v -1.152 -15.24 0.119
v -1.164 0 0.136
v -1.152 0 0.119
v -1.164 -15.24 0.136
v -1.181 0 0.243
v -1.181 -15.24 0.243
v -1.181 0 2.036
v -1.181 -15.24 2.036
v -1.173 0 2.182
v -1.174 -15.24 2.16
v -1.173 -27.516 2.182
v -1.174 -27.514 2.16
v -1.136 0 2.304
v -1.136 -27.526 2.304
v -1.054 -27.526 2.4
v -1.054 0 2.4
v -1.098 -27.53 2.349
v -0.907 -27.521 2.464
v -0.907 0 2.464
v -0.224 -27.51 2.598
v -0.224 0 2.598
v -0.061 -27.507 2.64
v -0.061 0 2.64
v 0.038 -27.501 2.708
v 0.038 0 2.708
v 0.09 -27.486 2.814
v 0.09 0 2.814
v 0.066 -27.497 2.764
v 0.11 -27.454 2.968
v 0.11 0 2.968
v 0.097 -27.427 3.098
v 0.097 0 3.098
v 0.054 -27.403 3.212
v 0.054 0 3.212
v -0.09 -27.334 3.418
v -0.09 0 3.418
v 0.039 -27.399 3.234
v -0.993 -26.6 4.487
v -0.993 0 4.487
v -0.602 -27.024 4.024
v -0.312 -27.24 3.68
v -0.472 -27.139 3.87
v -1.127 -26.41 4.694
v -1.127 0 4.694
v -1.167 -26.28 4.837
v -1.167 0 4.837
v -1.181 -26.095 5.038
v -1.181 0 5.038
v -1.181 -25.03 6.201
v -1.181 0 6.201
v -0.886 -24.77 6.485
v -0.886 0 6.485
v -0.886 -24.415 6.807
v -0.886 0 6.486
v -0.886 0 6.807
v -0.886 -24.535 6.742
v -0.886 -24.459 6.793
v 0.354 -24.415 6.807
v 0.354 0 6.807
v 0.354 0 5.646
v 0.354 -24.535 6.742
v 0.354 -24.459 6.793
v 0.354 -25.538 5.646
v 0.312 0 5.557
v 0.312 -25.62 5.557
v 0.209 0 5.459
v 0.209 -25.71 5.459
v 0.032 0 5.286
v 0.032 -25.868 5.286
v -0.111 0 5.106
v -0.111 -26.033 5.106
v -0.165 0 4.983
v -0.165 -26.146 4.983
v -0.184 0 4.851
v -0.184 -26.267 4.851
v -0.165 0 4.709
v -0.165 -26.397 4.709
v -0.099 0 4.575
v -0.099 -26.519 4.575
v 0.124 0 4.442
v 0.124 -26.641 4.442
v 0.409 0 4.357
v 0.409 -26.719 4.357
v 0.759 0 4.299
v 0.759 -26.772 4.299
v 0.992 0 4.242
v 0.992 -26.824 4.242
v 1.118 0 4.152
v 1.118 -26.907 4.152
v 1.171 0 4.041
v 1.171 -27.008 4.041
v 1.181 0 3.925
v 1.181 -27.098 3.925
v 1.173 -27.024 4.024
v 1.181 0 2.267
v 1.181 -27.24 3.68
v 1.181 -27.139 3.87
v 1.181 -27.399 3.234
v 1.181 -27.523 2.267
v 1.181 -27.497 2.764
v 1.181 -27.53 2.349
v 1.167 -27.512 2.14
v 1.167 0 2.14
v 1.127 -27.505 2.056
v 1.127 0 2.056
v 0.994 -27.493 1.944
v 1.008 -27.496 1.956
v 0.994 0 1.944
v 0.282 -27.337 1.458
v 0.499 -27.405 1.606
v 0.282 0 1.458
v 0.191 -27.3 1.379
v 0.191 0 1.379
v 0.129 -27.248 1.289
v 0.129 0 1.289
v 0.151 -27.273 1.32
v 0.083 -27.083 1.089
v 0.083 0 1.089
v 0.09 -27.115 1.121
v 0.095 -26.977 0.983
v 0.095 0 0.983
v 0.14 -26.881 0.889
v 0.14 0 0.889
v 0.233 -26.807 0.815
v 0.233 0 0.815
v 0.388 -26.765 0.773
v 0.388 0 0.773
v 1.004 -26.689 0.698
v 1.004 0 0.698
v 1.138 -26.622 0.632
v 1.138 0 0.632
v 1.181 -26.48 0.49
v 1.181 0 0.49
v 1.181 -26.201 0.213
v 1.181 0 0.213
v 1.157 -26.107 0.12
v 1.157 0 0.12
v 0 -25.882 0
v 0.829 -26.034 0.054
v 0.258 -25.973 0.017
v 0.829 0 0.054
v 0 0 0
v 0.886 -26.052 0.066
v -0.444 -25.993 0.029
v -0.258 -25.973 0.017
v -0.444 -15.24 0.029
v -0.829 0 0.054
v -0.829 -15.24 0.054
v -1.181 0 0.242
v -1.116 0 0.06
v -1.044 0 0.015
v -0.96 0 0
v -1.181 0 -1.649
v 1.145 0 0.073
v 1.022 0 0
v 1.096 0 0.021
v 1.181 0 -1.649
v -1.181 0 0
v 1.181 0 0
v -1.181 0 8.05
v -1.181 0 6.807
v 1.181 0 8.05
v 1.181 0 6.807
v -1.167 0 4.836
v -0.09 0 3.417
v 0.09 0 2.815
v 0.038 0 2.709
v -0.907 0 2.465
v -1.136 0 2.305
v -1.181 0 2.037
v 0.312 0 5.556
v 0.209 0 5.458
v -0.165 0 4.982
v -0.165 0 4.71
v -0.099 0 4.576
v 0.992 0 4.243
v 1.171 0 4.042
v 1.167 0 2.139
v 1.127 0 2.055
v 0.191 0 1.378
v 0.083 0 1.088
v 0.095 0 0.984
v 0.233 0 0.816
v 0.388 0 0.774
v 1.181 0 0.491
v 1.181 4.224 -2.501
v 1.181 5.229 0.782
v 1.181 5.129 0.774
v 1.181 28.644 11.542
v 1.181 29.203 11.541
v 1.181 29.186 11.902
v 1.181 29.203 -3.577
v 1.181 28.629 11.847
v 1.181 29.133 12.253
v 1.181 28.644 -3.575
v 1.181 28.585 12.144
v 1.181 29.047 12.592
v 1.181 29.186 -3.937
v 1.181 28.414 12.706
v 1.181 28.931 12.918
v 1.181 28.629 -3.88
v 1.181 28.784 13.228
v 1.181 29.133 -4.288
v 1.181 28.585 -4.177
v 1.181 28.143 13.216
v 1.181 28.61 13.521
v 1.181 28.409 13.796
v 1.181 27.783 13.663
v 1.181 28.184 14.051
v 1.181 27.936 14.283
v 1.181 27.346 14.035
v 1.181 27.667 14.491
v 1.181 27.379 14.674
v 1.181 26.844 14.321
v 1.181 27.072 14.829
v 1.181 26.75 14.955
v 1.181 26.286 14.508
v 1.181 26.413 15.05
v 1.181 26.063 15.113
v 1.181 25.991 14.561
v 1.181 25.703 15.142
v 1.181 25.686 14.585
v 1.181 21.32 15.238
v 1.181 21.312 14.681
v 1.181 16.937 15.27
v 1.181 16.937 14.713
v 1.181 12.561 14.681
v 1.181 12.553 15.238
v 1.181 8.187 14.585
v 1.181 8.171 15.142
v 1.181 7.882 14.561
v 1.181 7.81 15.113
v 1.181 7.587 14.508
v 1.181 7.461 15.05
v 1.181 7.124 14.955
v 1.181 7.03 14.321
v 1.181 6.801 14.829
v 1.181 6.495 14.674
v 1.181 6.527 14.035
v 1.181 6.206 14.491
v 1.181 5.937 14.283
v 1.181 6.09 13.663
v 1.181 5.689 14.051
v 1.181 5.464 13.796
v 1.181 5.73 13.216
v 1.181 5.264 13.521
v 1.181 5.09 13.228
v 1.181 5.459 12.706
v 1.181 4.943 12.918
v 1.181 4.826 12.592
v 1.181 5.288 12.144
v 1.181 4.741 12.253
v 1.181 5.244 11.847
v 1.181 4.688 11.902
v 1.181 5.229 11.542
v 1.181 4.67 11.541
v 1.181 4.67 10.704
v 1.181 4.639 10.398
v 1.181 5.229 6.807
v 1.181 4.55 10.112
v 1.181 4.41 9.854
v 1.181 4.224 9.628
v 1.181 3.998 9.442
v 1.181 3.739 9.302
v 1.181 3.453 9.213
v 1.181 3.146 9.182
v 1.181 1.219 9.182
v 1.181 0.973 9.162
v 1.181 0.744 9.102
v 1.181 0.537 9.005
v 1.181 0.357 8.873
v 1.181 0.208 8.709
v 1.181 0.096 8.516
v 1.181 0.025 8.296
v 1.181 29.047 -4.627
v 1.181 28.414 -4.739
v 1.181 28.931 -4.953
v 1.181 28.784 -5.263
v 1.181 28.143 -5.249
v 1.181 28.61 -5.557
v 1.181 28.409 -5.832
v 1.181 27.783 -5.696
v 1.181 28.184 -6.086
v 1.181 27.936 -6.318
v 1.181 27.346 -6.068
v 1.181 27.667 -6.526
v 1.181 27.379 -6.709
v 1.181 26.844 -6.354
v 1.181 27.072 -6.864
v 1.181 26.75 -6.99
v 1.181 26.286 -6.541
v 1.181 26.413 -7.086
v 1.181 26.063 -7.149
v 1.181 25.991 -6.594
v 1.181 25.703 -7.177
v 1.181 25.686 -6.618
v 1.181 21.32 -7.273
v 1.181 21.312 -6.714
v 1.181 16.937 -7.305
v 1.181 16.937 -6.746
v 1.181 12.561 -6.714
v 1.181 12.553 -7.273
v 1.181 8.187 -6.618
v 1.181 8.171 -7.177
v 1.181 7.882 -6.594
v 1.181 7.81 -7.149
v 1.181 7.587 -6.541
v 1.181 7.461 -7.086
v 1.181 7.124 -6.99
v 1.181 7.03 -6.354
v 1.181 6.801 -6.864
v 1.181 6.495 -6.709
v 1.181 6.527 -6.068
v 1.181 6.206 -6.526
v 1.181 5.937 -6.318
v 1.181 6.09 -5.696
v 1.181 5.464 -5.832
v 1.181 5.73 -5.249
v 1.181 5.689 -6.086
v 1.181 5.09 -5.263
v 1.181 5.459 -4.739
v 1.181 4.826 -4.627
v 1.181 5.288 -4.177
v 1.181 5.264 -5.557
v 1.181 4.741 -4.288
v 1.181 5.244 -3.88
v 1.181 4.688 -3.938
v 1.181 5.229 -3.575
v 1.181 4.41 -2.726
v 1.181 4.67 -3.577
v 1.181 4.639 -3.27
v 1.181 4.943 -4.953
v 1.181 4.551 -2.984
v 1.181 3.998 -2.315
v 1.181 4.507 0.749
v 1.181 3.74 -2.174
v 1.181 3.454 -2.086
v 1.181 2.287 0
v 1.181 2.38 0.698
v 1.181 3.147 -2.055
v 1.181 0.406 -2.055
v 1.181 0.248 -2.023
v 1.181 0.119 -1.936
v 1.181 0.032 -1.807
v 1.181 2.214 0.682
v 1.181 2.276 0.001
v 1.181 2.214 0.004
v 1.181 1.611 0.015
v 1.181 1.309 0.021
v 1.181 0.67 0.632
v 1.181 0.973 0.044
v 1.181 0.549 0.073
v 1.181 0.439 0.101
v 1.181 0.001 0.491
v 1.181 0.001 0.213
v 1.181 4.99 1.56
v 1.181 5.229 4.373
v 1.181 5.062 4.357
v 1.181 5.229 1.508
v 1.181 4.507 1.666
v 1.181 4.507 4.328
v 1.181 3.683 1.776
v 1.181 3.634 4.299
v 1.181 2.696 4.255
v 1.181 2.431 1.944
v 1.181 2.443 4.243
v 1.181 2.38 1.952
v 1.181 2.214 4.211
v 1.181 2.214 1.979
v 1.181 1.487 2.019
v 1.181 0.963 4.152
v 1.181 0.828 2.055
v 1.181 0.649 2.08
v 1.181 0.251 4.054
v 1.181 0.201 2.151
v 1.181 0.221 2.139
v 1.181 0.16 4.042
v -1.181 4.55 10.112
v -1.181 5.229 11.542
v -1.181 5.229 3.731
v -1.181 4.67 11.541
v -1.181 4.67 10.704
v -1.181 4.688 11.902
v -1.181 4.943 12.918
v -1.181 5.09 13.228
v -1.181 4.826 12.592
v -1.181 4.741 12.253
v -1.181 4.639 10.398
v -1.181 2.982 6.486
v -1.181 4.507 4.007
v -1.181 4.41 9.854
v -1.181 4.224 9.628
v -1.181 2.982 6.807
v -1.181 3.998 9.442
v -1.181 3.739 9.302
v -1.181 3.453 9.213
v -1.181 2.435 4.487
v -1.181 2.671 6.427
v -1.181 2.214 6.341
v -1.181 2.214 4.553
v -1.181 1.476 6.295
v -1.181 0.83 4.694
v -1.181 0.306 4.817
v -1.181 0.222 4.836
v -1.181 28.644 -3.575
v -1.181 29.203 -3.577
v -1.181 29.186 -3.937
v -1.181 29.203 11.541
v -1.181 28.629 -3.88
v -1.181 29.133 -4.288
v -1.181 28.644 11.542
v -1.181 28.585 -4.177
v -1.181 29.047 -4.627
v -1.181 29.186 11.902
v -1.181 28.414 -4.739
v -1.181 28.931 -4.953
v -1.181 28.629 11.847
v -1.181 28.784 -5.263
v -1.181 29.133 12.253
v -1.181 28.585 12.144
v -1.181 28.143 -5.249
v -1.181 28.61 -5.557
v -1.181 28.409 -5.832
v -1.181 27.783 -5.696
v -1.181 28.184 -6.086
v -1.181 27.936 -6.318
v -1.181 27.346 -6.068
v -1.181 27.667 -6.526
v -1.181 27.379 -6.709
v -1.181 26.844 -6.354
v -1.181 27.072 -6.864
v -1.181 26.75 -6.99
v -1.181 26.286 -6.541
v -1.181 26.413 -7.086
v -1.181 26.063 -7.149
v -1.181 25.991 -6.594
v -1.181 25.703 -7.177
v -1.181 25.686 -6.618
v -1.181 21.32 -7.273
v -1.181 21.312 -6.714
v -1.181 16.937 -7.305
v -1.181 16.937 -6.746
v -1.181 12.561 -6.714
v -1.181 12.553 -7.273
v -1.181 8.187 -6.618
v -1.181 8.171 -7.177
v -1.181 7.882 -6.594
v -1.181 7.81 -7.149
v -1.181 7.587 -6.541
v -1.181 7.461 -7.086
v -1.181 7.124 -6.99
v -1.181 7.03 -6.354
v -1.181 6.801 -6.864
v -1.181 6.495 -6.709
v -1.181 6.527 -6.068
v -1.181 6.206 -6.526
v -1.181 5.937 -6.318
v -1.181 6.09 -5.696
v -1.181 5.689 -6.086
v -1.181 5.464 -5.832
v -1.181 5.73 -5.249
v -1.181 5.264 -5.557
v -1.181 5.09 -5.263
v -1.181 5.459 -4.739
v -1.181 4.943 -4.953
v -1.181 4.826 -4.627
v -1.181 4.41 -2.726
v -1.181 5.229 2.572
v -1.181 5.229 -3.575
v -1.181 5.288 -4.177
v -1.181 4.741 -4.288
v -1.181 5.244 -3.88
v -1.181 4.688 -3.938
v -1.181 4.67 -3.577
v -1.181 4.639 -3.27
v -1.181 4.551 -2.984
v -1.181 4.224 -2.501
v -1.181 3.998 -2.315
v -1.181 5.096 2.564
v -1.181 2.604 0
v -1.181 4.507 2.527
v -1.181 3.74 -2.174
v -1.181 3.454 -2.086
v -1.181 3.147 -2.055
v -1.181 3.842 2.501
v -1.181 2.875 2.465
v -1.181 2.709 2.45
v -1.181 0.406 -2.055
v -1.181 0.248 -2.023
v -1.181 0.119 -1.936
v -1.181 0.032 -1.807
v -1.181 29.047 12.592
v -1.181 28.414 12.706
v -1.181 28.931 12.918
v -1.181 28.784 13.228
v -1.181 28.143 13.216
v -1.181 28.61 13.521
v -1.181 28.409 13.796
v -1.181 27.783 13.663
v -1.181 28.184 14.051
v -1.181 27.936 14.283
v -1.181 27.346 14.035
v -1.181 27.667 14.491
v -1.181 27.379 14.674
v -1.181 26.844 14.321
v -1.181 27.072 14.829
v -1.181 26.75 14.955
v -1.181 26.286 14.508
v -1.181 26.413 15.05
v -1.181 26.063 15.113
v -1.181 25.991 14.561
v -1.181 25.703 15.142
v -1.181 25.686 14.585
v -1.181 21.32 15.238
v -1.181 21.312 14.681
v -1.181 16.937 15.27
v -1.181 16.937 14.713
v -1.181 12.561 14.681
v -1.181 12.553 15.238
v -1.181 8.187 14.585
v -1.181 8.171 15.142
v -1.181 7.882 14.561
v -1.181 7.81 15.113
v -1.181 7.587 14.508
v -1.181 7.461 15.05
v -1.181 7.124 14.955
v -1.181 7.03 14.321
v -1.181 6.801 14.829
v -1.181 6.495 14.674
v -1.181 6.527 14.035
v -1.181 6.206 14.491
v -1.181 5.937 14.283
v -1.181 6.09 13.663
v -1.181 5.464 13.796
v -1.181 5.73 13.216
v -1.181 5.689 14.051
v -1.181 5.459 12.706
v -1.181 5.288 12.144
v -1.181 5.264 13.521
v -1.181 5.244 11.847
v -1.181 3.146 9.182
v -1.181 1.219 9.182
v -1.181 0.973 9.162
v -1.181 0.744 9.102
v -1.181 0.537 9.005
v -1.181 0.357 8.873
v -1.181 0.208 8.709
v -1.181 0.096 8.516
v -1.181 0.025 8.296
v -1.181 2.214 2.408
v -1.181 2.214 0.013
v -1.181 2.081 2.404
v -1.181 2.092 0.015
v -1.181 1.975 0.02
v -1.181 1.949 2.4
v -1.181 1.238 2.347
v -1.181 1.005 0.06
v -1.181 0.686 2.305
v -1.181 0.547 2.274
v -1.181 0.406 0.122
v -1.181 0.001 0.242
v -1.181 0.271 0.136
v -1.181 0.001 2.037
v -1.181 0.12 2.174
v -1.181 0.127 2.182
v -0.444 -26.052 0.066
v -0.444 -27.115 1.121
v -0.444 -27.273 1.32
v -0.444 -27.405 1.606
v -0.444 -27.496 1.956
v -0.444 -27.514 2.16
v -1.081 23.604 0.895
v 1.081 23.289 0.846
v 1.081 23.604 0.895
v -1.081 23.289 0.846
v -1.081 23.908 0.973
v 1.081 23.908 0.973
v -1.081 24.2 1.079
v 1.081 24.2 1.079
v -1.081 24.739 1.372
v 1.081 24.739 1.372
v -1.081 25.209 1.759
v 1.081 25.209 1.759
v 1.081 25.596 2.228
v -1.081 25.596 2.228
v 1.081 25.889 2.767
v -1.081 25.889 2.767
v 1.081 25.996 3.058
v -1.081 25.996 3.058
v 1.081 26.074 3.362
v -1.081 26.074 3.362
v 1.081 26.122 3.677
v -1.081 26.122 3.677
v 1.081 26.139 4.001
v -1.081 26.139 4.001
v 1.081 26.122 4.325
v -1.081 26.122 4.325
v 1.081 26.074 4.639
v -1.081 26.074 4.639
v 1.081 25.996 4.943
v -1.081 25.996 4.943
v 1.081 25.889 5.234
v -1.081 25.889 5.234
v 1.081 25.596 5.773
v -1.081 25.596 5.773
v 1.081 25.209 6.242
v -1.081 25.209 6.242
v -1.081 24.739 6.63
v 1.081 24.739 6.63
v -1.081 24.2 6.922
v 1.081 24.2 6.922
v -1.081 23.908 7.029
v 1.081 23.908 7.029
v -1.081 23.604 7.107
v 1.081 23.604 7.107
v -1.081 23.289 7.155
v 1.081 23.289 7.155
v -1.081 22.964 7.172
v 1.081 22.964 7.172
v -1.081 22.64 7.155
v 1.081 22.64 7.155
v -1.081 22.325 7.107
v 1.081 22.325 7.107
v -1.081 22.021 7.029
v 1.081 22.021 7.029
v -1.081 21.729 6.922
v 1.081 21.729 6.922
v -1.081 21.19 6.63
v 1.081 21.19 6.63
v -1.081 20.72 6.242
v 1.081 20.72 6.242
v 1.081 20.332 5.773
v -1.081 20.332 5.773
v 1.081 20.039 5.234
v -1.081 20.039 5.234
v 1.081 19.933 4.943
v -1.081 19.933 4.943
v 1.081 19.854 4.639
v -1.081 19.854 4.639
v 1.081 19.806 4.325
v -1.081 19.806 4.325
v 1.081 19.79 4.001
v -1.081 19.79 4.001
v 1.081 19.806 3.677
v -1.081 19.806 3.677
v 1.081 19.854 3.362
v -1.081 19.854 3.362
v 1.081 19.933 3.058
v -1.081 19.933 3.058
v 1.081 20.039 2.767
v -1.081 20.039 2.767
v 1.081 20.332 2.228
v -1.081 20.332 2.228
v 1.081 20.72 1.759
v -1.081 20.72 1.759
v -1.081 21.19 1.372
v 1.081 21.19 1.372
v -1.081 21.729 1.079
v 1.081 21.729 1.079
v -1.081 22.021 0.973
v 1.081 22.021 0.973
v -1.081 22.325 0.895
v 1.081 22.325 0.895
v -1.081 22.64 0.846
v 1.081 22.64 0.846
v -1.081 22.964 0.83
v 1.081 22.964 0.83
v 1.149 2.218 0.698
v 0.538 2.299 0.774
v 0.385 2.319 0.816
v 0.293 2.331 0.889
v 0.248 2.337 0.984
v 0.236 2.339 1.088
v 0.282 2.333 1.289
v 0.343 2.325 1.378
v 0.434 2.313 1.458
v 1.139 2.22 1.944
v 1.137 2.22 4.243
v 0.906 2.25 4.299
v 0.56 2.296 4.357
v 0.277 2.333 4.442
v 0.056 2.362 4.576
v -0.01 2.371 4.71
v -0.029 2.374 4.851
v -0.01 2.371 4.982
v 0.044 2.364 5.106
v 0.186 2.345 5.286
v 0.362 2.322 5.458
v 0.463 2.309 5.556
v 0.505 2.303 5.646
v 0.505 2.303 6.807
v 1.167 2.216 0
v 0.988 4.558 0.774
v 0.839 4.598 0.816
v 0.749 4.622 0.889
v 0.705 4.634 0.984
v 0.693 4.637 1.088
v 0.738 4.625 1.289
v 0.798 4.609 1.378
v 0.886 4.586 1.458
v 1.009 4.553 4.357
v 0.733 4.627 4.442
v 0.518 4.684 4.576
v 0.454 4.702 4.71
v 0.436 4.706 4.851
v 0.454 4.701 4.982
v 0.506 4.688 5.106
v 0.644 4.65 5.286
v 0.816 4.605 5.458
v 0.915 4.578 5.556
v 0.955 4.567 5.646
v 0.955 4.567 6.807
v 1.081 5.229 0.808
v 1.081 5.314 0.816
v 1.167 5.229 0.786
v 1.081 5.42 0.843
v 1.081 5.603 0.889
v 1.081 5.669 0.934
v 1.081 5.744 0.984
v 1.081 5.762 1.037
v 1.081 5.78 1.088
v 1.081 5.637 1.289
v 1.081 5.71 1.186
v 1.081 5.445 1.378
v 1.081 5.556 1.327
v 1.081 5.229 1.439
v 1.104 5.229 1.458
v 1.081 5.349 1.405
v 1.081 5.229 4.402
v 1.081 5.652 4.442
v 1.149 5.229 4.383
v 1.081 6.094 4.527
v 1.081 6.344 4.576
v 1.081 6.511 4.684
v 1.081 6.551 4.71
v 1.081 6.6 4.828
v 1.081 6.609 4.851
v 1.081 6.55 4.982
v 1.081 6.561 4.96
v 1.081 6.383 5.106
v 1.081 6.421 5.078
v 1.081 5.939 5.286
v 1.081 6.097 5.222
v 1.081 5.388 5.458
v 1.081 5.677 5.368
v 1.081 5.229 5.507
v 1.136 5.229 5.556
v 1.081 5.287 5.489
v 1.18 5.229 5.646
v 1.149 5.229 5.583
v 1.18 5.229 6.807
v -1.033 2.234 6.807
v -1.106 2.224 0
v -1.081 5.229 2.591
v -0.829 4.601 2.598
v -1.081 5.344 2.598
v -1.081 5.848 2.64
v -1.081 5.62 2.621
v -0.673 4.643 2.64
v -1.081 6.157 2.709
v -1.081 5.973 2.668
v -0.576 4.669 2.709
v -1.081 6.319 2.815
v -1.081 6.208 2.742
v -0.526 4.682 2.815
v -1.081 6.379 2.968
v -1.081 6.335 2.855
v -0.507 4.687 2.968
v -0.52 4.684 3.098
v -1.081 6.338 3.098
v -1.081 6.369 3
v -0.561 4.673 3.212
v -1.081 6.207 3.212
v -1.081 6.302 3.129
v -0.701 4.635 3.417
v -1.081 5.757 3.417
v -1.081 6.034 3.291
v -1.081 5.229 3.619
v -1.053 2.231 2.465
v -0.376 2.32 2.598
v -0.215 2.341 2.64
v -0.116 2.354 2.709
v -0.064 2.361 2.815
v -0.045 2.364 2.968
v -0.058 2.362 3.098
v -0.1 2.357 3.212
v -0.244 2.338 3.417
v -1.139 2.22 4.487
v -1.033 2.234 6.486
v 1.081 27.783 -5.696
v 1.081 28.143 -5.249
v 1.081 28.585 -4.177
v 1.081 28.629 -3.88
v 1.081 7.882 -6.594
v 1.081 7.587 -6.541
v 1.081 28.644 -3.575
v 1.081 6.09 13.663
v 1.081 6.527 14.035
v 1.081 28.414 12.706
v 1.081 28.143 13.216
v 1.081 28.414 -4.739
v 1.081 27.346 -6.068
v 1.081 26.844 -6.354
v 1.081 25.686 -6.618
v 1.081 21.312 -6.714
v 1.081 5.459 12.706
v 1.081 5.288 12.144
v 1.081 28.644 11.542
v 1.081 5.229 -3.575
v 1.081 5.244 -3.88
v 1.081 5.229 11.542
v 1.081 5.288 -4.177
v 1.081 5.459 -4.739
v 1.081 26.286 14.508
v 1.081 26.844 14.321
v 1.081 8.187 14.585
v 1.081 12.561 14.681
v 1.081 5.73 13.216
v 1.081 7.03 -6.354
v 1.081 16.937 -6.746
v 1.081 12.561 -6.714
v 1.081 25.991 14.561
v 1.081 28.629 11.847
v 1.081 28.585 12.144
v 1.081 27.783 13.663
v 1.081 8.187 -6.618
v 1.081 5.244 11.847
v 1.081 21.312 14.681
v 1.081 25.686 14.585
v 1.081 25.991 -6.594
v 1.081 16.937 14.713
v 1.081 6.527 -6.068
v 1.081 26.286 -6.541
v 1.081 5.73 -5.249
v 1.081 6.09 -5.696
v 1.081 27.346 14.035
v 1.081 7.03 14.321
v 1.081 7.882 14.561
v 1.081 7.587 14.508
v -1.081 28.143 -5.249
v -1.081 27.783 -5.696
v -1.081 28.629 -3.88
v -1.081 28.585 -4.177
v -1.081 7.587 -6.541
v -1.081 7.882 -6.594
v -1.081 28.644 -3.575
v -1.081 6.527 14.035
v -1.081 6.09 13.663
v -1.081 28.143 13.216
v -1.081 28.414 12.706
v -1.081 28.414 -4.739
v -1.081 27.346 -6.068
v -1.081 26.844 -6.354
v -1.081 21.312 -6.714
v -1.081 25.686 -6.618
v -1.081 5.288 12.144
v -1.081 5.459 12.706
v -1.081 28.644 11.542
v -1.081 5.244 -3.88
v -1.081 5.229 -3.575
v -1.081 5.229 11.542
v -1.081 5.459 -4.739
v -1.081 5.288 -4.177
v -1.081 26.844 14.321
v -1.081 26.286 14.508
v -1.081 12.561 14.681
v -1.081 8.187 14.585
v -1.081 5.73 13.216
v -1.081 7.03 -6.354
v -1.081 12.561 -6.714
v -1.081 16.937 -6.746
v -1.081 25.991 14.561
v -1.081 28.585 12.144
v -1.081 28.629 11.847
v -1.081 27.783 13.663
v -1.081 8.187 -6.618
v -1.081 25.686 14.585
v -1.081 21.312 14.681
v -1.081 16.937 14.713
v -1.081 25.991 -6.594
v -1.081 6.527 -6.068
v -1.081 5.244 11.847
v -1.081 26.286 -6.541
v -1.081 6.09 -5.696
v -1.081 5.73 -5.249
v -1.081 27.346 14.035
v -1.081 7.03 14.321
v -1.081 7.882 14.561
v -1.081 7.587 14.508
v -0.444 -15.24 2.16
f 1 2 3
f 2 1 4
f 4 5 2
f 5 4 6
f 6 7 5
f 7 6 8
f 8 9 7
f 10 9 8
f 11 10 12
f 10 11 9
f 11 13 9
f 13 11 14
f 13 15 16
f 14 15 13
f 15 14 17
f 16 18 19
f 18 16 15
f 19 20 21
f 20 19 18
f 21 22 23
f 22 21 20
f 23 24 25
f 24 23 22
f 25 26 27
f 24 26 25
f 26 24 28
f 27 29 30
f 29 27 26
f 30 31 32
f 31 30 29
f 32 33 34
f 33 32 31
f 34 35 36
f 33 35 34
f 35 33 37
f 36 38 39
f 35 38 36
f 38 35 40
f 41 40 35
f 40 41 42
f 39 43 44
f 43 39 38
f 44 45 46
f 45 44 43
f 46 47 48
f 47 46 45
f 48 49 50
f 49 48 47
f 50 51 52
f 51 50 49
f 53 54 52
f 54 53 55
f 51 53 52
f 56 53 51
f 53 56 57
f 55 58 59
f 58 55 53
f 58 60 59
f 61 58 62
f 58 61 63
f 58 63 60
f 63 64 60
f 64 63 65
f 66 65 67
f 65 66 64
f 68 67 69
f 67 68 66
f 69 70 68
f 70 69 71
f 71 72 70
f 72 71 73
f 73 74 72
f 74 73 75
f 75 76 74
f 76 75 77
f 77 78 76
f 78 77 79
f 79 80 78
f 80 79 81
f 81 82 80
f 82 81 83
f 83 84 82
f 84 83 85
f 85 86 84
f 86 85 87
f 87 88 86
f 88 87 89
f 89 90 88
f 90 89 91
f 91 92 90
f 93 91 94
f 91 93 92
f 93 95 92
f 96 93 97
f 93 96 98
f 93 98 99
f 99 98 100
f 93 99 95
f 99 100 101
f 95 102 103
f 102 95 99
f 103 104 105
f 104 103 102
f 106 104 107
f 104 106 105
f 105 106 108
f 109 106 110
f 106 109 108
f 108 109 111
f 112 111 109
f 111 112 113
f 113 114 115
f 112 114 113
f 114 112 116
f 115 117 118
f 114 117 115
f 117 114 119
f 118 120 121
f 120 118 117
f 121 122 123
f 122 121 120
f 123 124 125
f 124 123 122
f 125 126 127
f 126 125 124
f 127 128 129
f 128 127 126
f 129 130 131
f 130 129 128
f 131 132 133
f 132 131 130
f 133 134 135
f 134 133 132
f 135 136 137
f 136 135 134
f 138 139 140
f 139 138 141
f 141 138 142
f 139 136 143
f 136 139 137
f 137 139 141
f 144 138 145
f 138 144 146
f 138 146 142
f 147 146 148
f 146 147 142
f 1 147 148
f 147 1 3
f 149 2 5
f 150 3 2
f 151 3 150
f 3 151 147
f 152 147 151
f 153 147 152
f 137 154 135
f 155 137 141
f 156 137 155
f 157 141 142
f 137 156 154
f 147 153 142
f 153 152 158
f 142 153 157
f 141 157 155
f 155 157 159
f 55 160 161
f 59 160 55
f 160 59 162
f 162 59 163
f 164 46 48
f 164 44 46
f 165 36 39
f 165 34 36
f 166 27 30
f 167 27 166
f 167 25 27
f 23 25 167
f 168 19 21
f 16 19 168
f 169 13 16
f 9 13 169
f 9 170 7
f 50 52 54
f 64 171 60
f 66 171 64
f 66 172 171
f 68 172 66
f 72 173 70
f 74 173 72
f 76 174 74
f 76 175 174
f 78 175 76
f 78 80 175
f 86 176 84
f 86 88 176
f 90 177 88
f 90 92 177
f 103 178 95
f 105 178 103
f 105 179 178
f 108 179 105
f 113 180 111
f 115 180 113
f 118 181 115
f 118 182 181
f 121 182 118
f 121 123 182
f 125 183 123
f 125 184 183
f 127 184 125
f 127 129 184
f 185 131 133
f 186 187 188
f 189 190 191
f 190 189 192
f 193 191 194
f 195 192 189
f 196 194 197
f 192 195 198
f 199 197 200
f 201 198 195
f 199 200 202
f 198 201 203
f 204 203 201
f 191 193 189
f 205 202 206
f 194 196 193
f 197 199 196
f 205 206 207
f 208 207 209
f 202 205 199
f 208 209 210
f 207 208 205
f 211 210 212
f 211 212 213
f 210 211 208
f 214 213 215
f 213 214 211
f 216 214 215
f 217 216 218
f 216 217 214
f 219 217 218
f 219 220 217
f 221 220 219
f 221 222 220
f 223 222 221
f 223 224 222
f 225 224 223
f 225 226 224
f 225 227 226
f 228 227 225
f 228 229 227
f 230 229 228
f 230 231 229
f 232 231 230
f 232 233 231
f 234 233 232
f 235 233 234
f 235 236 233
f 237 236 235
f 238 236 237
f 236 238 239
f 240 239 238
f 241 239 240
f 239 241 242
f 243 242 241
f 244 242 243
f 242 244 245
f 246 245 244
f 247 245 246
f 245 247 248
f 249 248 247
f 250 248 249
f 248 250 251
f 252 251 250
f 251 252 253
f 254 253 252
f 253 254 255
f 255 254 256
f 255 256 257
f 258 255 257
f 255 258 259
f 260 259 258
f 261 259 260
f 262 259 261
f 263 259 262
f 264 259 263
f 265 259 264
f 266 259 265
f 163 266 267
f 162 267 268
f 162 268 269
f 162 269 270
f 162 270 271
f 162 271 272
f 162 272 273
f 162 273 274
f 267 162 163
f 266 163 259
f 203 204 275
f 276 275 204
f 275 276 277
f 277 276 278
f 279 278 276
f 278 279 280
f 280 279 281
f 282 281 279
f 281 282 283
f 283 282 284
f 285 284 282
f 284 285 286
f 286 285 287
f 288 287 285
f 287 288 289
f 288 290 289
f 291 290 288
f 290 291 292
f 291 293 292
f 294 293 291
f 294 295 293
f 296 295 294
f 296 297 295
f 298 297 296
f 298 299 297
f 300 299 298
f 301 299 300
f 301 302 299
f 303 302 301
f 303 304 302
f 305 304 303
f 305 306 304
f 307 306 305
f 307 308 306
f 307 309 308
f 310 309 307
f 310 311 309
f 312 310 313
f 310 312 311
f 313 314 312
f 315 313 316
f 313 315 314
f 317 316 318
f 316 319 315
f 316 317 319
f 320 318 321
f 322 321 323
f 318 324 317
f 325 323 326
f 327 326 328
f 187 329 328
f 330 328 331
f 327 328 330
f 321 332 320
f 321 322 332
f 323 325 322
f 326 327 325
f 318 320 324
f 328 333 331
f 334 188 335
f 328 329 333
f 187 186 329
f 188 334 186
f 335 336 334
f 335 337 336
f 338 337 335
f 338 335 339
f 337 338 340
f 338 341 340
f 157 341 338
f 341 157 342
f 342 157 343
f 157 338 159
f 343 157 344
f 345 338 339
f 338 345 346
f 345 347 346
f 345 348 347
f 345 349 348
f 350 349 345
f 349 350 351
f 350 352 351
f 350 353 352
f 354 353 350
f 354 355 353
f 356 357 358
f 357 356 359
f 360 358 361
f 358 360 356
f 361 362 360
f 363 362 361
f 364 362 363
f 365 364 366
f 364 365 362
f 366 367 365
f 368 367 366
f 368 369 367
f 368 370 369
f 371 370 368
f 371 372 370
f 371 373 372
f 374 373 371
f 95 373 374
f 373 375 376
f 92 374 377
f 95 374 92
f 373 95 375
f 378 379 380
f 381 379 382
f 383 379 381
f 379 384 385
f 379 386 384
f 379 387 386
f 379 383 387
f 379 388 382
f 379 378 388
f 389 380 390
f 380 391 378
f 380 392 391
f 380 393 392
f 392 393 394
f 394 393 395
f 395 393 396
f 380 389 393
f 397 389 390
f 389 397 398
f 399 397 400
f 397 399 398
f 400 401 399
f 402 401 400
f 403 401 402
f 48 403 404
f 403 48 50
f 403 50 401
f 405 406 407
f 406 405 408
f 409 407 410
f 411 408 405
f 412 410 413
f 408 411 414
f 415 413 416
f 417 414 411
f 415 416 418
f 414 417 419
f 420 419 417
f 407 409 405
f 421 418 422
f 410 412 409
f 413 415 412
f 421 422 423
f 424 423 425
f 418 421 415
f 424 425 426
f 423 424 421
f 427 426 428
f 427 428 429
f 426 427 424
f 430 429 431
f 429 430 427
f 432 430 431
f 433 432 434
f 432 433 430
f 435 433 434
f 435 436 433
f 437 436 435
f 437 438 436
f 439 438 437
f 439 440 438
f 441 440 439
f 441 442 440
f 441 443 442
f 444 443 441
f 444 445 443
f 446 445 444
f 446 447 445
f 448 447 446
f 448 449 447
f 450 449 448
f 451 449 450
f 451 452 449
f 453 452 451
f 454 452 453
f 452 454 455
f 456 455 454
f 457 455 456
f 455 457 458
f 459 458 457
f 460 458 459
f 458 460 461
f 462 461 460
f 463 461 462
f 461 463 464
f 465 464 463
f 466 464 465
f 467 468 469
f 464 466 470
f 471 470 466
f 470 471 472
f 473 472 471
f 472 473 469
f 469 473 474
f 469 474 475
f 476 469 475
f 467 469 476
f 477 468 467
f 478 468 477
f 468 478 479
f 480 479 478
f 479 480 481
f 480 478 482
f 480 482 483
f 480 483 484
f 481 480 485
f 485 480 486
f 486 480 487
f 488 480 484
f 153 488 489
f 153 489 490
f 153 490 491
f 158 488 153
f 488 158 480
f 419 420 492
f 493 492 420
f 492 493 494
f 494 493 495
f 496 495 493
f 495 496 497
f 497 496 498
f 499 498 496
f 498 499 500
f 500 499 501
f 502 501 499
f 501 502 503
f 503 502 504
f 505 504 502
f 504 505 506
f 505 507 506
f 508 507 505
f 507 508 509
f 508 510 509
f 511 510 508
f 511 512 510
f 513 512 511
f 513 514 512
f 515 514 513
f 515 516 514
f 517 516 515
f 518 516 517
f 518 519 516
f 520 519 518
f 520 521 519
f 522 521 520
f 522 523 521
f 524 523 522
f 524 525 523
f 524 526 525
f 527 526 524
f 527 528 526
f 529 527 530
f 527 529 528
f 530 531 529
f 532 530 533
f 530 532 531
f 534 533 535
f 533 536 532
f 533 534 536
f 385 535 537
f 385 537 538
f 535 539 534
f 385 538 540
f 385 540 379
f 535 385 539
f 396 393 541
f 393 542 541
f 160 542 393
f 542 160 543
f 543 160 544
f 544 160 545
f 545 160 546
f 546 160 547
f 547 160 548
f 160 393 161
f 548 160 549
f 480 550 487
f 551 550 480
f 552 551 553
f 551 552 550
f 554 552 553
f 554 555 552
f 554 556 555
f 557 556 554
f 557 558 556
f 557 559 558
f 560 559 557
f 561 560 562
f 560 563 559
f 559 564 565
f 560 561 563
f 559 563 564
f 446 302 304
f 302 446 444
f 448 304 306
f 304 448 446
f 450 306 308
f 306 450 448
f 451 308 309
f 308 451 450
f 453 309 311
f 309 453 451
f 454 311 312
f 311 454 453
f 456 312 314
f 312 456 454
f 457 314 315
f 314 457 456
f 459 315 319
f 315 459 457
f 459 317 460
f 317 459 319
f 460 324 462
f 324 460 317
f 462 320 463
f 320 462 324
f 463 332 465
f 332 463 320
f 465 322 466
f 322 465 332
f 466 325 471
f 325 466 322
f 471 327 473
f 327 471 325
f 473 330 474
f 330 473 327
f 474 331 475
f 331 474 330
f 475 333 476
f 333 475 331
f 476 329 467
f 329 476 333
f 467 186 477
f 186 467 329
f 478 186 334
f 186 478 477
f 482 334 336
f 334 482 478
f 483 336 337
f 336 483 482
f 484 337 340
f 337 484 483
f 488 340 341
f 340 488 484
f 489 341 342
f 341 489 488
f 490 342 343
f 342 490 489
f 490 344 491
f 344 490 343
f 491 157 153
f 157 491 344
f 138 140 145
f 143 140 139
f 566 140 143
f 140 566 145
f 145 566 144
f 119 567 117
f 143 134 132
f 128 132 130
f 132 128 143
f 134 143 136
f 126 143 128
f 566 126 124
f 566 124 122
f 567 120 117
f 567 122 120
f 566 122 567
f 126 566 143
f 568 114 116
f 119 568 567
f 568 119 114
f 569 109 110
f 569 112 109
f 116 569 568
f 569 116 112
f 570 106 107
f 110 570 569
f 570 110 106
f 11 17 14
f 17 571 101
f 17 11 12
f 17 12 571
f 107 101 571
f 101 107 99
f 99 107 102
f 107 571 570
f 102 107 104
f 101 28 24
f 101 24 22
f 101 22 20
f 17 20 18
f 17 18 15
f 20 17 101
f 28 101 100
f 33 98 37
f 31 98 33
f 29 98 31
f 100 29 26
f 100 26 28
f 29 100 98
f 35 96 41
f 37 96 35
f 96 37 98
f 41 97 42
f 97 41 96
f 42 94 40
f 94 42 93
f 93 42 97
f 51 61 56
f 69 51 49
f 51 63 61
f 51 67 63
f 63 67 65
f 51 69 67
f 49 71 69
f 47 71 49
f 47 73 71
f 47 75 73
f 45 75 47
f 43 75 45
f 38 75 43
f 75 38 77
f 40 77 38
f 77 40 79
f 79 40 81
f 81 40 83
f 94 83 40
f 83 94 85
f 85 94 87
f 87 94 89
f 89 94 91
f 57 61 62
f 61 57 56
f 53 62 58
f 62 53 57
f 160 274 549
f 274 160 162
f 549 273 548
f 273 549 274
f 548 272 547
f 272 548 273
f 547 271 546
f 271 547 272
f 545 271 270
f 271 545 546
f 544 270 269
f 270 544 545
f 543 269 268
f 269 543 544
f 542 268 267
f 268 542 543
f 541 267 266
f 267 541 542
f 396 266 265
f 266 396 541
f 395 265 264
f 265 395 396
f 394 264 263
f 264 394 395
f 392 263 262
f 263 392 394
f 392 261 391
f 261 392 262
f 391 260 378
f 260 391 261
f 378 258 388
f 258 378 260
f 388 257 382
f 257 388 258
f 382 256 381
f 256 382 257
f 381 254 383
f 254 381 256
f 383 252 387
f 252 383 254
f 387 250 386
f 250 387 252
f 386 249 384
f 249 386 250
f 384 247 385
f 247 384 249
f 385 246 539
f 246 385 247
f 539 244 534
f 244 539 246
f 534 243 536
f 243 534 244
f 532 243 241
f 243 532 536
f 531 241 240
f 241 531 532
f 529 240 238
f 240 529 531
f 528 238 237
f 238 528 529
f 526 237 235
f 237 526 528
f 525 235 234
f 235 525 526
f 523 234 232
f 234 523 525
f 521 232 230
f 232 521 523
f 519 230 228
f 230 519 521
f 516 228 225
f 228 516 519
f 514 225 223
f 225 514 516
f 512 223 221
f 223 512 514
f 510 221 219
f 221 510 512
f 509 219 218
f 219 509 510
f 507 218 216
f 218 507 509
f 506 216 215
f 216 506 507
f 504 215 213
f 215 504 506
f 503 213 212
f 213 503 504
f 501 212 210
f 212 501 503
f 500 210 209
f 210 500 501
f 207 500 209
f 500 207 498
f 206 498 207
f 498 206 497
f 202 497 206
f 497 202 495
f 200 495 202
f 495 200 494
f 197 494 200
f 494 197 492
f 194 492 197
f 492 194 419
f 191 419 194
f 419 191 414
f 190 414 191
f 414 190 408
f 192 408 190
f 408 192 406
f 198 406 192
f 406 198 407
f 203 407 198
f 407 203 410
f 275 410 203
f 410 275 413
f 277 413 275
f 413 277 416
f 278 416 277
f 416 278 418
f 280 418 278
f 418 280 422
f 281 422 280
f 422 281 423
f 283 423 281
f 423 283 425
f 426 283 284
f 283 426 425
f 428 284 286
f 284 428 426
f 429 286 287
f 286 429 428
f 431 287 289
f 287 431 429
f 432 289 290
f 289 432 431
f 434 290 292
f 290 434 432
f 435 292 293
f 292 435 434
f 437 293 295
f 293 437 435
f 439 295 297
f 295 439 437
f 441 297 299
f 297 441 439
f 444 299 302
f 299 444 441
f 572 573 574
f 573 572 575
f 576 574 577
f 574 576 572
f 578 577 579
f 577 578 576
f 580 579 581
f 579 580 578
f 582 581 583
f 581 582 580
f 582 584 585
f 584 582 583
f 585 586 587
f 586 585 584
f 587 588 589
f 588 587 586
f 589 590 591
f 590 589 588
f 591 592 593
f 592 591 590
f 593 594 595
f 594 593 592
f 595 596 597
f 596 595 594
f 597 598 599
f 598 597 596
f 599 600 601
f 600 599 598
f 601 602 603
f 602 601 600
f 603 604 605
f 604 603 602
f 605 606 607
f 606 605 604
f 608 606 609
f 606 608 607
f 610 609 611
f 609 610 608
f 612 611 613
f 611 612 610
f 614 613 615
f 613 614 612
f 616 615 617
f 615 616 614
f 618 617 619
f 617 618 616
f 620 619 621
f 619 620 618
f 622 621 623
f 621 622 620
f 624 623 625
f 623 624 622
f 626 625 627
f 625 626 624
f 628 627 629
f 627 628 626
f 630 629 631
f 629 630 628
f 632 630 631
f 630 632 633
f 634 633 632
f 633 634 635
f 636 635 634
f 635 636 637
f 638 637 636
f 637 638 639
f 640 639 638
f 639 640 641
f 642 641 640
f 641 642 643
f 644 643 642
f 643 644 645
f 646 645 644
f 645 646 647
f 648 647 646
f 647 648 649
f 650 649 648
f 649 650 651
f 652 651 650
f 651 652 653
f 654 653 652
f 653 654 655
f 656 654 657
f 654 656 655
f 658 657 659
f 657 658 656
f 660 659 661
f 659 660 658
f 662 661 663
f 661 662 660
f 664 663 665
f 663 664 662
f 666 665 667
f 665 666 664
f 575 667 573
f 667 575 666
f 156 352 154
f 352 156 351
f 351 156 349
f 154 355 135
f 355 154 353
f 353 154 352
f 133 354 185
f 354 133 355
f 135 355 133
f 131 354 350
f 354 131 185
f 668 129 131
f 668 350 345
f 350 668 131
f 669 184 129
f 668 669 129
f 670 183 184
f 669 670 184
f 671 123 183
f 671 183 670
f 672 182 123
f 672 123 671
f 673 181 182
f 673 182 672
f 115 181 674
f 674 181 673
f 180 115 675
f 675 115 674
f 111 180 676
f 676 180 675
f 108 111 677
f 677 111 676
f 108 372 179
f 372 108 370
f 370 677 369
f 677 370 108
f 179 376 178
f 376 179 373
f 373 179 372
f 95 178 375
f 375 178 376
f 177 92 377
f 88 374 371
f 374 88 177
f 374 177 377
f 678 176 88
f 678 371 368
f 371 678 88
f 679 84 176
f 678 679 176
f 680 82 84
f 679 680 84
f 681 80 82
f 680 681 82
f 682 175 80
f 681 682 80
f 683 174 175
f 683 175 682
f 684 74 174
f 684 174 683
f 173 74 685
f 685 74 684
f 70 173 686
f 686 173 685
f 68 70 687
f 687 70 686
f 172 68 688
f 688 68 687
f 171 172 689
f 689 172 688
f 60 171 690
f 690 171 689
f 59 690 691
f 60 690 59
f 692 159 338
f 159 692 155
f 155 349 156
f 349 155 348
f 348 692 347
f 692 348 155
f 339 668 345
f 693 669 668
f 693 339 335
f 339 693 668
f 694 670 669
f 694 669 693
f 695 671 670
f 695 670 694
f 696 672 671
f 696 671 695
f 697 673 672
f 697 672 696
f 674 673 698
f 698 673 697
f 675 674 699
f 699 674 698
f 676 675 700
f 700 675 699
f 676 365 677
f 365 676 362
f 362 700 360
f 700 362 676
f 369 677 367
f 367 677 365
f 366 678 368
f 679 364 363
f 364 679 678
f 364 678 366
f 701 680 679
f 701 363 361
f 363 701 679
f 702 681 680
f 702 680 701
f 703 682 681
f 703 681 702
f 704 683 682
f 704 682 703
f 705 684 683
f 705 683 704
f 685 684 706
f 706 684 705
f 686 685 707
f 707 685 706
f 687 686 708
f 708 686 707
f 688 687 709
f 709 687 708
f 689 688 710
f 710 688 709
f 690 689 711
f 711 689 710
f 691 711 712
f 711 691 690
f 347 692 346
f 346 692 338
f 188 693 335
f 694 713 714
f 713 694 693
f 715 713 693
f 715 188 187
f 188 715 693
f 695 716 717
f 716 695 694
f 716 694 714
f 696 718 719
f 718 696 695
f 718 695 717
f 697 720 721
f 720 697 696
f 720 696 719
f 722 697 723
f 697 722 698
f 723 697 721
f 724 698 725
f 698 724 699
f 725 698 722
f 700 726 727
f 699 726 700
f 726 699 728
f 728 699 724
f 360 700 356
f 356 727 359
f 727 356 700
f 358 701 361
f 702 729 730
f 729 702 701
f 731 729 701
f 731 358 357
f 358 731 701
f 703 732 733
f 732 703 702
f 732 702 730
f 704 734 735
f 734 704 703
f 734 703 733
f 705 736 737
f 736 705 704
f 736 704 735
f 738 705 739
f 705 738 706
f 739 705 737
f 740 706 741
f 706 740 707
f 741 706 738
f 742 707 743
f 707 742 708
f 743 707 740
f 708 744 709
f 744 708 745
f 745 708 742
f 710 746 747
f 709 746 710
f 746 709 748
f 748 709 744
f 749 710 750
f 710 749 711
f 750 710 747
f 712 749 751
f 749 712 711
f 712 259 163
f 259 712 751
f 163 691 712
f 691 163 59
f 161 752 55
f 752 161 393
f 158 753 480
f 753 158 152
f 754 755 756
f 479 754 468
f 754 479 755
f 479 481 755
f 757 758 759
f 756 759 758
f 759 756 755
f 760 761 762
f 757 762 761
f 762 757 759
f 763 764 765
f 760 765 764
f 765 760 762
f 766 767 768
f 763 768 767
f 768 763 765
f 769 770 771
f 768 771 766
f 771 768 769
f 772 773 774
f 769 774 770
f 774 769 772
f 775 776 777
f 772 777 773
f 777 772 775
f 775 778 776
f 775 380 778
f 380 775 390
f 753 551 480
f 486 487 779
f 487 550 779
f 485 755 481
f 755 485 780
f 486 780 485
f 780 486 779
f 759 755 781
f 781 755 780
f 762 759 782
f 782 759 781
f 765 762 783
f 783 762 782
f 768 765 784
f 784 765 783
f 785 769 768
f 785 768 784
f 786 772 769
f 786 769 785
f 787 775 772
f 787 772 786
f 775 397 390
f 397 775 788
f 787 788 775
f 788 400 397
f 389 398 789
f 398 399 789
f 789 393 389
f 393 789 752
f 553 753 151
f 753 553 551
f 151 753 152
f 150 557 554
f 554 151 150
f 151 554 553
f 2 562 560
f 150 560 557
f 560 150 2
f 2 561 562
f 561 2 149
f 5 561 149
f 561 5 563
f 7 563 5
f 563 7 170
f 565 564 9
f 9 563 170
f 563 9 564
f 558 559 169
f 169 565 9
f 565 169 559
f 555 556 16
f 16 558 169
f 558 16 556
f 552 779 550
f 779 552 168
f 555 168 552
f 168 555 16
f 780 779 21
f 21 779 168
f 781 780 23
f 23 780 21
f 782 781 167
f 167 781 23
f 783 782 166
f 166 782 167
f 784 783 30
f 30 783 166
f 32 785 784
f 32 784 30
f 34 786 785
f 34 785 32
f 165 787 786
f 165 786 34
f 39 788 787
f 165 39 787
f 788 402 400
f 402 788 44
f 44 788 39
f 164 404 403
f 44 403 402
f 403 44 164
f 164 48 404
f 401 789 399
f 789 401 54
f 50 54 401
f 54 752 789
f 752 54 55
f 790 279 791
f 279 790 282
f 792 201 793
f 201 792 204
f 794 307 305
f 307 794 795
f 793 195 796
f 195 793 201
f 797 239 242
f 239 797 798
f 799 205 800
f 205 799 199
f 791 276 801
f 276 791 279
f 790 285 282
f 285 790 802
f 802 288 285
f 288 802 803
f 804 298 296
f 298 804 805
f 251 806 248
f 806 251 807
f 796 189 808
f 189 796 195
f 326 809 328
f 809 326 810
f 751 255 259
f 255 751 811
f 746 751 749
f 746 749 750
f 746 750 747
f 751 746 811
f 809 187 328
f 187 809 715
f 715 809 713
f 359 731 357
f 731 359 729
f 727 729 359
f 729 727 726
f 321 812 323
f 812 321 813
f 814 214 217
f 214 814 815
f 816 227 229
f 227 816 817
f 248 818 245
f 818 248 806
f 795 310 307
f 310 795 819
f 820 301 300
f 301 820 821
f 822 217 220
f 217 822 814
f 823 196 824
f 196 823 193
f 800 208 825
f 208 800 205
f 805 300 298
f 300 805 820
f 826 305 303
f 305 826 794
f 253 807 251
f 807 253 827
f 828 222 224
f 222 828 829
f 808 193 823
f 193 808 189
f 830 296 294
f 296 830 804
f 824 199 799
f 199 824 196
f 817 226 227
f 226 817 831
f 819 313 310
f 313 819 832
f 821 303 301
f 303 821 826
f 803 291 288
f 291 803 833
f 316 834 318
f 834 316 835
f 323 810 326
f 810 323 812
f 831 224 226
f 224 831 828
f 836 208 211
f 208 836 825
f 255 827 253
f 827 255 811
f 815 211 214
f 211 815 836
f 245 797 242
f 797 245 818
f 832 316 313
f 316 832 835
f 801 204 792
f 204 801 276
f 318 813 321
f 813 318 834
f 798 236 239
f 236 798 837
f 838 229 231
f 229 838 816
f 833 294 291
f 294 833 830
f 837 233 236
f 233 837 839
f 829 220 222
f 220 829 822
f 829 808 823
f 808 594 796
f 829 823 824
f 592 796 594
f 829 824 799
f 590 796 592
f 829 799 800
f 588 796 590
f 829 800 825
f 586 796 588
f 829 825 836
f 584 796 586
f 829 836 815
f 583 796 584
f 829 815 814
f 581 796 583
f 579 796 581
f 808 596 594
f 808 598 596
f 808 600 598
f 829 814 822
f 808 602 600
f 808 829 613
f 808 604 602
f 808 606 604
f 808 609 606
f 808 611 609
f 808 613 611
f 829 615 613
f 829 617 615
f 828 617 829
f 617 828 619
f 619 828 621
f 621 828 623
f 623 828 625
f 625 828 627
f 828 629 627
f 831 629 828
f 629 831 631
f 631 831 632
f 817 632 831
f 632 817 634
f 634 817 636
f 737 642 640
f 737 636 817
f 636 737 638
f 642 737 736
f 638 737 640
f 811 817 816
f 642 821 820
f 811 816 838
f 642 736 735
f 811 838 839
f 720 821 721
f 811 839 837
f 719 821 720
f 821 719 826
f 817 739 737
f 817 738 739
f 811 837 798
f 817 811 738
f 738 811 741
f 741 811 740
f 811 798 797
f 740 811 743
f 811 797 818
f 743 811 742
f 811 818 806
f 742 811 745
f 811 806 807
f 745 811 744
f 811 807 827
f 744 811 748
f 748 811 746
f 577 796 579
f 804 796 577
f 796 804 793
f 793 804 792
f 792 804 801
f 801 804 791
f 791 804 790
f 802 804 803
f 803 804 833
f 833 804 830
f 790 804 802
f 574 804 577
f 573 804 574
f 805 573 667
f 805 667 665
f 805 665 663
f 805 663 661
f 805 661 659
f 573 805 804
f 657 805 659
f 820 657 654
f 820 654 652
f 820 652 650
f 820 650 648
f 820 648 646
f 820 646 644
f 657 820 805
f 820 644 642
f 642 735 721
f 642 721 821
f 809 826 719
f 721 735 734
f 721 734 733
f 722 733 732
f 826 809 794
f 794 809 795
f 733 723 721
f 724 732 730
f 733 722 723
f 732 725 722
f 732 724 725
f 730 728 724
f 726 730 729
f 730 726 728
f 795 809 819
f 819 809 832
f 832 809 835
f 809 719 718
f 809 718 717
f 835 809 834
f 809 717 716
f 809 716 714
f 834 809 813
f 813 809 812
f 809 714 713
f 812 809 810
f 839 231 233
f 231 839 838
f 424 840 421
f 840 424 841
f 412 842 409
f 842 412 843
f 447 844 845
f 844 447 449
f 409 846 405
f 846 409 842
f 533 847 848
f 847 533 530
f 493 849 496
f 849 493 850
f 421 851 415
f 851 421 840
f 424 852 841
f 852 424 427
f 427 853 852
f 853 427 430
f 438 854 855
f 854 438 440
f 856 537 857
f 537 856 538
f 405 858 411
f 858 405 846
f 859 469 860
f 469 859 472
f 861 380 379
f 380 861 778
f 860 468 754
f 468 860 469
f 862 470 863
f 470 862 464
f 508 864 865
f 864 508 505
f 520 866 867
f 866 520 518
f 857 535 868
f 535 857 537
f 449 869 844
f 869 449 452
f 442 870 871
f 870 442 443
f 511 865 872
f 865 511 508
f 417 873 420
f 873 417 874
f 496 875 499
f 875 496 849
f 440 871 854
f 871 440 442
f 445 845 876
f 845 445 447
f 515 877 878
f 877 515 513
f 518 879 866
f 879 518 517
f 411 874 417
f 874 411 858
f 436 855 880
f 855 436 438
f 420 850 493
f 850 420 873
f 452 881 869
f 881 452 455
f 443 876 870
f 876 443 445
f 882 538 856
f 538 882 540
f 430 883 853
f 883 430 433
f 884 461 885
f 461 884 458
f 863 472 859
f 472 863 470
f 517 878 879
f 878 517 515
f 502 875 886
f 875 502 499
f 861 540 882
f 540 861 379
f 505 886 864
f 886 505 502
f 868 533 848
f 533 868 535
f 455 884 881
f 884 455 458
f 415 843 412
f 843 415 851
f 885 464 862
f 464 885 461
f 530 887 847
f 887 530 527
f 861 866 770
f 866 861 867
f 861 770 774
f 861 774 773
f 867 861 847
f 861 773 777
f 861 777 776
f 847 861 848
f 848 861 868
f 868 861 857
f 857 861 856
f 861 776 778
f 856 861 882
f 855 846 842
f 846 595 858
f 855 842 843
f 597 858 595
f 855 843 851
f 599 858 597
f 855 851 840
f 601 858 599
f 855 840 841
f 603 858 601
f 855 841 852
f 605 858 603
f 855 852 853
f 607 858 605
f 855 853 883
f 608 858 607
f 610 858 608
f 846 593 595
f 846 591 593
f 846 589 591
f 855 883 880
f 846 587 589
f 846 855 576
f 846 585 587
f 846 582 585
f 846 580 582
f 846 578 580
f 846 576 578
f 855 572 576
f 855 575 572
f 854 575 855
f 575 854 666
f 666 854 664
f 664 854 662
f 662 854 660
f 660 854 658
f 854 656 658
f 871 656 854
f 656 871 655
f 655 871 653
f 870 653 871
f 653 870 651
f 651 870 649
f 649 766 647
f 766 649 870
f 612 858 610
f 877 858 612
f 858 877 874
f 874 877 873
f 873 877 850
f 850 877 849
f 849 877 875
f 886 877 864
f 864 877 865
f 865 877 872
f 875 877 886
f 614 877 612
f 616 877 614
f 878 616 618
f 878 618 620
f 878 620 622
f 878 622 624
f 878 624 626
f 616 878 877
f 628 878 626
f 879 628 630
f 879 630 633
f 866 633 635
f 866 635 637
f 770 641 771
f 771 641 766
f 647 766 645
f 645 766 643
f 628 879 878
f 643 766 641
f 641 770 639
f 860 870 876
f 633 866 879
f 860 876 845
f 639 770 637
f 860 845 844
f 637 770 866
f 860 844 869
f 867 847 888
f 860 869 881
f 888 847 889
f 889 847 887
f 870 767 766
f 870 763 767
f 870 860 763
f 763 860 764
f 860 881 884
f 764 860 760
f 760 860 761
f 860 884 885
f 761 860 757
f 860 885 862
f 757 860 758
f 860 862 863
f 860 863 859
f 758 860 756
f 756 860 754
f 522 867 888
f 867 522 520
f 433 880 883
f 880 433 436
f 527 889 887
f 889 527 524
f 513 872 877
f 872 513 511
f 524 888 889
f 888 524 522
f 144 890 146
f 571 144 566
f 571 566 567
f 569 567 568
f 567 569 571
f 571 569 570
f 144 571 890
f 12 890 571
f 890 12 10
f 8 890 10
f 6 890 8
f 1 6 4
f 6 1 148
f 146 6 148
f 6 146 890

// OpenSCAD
use <keygen.scad>
include <medeco.scad>

module medeco_m3(bitting="",
                 outline_name="M3",
                 warding_name="M3",
                 slider_depth=0.6) {

    name = "Medeco M3";

    /*
        "A" variants of key outlines indicates 6-pin version.

        Bitting is specified from bow to tip, 1-6, with 1 being the shallowest cut and 6 being the deepest.

        After each number, a letter K,B,Q,L,C,R,M,D,S is specified for the cut angle and offset.

        Example: 2K5B3Q6M3S
                          
        Note: KBQ & MDS Biaxial cuts (Fore & Aft) do not appear to be used in conjunction with LCR Classic cuts(Centered)
        
        Example: 2K5B3Q6M3S or 2L5C3R6L3R
                          
        Note: On non-Biaxial(locks not utilizing Fore or Aft cuts) M3 Cam locks, only the deepest 4 cut depths are used (3,4,5,6) and only the deepest 3 cut depths (4,5,6) on Biaxial M3 Cam locks
        
        Example: 3L5C3R6L4R or 4K5B4Q6M4S
        
        The M3 slider variable has been added and can be measured in inches from either the key or the face of a gutted lock.
    */

    outlines_k = ["A1515",
                  "1515",
                  "A1517",
                  "1517",
                  "1518",
                  "1542",
                  "1543",
                  "A1638",
                  "1638",
                  "1644",
                  "1655",
                  "M3"];

    wardings_k = ["1515",
                  "1517",
                  "1518",
                  "1542",
                  "1543",
                  "1638",
                  "1644",
                  "1655",
                  "M3"];

    outline_param = key_lkup(outlines_k, outlines_v, outline_name);
    outline_points = outline_param[0];
    outline_paths = outline_param[1];
    offset = outline_param[2];
    engrave_points = outline_param[3];
    engrave_paths = outline_param[4];

    warding_points = key_lkup(wardings_k, wardings_v, warding_name);
    
    cut_locations = [for(i=[0.244, 0.414, 0.584, 0.754, 0.924, 1.094]) i*25.4];
    depth_table = [for(i=[0.272+0.025:-0.025:0.140]) i*25.4];
    angles_k = ["K", "B", "Q", "M", "D", "S", "L", "C", "R"];
    angles_v = [[20, -.7874], [0, -.7874], [-20, -.7874],
                [20, .7874],  [0, .7874],  [-20, .7874], 
                [20, 0],      [0, 0],      [-20, 0]];

    bitting_depth = [for(i=[0:2:len(bitting)-1]) bitting[i]];
    bitting_angle = [for(i=[1:2:len(bitting)-1]) bitting[i]];
    heights = key_code_to_heights(bitting_depth, depth_table);
    angles_and_offsets = [for(c=bitting_angle) key_lkup(angles_k, angles_v, c)];
    angles = [for(c=angles_and_offsets) c[0]];
    offsets = [for(c=angles_and_offsets) c[1]];
    
    difference() {
        if($children == 0) {
            key_blank(outline_points,
                      warding_points,
                      outline_paths=outline_paths,
                      engrave_right_points=engrave_points,
                      engrave_right_paths=engrave_paths,
                      engrave_left_points=engrave_points,
                      engrave_left_paths=engrave_paths,
                      offset=offset,
                      plug_diameter=12.7);
        } else {
            children(0);
        }
        key_bitting(heights, cut_locations + offsets,
                    flat=.381, angle=86, // from CW-1012 cutter specs
                    angles=angles);
        m3_slider(slider*25.4);
    }
}

// Defaults
bitting="";
outline="M3";
warding="M3";
slider=0.6;
medeco_m3(bitting, outline, warding, slider);
